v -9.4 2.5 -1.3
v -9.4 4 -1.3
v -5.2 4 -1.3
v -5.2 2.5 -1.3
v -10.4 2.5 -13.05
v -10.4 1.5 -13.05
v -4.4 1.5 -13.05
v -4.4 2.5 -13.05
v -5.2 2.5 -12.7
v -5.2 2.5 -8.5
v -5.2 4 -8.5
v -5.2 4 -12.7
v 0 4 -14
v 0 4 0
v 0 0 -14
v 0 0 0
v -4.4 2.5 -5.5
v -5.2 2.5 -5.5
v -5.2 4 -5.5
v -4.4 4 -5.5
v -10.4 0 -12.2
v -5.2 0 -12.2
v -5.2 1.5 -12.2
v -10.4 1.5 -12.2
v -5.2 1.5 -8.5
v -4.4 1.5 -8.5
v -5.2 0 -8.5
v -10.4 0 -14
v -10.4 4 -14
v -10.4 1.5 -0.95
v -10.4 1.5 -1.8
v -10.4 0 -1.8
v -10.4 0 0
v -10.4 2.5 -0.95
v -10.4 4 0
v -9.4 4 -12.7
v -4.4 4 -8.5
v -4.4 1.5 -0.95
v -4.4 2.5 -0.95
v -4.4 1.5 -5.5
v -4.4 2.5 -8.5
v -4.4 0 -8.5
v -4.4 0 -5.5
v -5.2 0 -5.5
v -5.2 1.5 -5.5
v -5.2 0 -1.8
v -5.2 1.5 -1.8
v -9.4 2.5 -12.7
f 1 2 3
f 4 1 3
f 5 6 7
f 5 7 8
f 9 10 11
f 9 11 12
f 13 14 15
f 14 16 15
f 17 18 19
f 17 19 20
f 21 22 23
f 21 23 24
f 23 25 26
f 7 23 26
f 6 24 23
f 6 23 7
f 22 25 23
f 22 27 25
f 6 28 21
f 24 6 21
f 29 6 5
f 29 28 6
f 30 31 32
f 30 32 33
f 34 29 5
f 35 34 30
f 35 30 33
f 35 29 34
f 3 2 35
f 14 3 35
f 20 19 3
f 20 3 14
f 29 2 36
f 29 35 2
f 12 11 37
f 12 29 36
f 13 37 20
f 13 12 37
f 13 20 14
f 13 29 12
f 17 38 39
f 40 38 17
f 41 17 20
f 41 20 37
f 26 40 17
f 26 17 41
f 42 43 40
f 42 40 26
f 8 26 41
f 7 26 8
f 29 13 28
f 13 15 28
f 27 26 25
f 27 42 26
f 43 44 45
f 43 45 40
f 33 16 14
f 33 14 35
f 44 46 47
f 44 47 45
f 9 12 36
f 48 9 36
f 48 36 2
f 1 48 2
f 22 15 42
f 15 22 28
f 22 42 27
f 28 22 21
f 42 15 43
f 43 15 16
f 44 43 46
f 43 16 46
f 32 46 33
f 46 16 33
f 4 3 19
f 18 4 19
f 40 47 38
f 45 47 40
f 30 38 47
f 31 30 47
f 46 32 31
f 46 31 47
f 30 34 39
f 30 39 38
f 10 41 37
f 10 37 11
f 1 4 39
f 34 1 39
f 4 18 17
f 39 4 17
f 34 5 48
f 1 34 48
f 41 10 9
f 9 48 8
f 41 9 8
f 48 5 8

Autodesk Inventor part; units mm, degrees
ref_plane "YZ Plane" through (0, 0, 0) normal (1, 0, 0) x (0, 1, 0)
ref_plane "XZ Plane" through (0, 0, 0) normal (0, 1, 0) x (-1, 0, 0)
ref_plane "XY Plane" through (0, 0, 0) normal (0, 0, 1) x (1, 0, 0)
sketch "스케치1" plane through (0, 0, 0) normal (0, 1, 0) x (-1, 0, 0)
  line L0 (0, 0) -> (0, -14)
  line L1 (0, -14) -> (10.4, -14)
  line L2 (0, 0) -> (10.4, 0)
  line L3 (10.4, 0) -> (10.4, -1.8)
  line L4 (10.4, -1.8) -> (5.2, -1.8)
  line L5 (5.2, -1.8) -> (5.2, -5.5)
  line L6 (5.2, -5.5) -> (4.4, -5.5)
  line L7 (4.4, -5.5) -> (4.4, -8.5)
  line L8 (4.4, -8.5) -> (5.2, -8.5)
  line L9 (5.2, -8.5) -> (5.2, -12.2)
  line L10 (5.2, -12.2) -> (10.4, -12.2)
  line L11 (10.4, -12.2) -> (10.4, -14)
  line L12 (10.4, -0.95) -> (4.4, -0.95) construction
  line L13 (4.4, -0.95) -> (4.4, -13.05) construction
  line L14 (4.4, -13.05) -> (10.4, -13.05) construction
  dimension "d0" = 14
  dimension "d2" = 10.4
  dimension "d3" = 1.8
  dimension "d5" = 3.7
  dimension "d6" = 0.8
  dimension "d7" = 3
  dimension "d8" = 0.8
  dimension "d9" = 3.7
  dimension "d47" = 12.1
  dimension "d48" = 0.85
  dimension "d49" = 0.85
  dimension "d63" = 6
extrude "돌출1" add sketch "스케치1" along normal blind 4
sketch "스케치9" plane through (-10.4, 0, -14) normal (-1, 0, 0) x (0, 0, 1)
  line L0 (12.2, 0) -> (14, 0) projected
  line L1 (14, 0) -> (14, 4) projected
  line L2 (12.2, 4) -> (14, 4) projected
  line L3 (12.2, 0) -> (12.2, 4) projected
  line L4 (0, 0) -> (1.8, 0) projected
  line L5 (1.8, 0) -> (1.8, 4) projected
  line L6 (0, 4) -> (1.8, 4) projected
  line L7 (0, 0) -> (0, 4) projected
  line L8 (13.05, 1.5) -> (0.95, 1.5)
  line L9 (0.95, 1.5) -> (0.95, 2.5)
  line L10 (0.95, 2.5) -> (13.05, 2.5)
  line L11 (13.05, 2.5) -> (13.05, 1.5)
  dimension "d55" = 0.95
  dimension "d56" = 0.95
  dimension "d60" = 1
  dimension "d61" = 1.5
  dimension "d62" = 1.5
  dimension "d71" = 12.1
extrude "돌출9" cut sketch "스케치9" against normal blind 6 contours L8 L5 L10 L3 | L3 L10 L11 L8 | L8 L9 L10 L5
sketch "스케치10" plane through (0, 4, 0) normal (0, 1, 0) x (1, 0, 0)
  line L0 (0, 0) -> (0, 14) projected
  line L1 (0, 14) -> (-10.4, 14) projected
  line L2 (-10.4, 14) -> (-10.4, 12.2) projected
  line L3 (-10.4, 12.2) -> (-5.2, 12.2) projected
  line L4 (-5.2, 12.2) -> (-5.2, 8.5) projected
  line L5 (-5.2, 8.5) -> (-4.4, 8.5) projected
  line L6 (-4.4, 8.5) -> (-4.4, 5.5) projected
  line L7 (-4.4, 5.5) -> (-5.2, 5.5) projected
  line L8 (-5.2, 5.5) -> (-5.2, 1.8) projected
  line L9 (-5.2, 1.8) -> (-10.4, 1.8) projected
  line L10 (-10.4, 1.8) -> (-10.4, 0) projected
  line L11 (-10.4, 0) -> (0, 0) projected
  line L12 (-5.2, 1.8) -> (-10.4, 1.8) projected
  line L13 (-5.2, 12.2) -> (-10.4, 12.2) projected
  line L14 (-10.4, 1.8) -> (-9.4, 1.8)
  line L15 (-9.4, 1.8) -> (-9.4, 12.2)
  line L16 (-9.4, 12.2) -> (-10.4, 12.2)
  line L17 (-10.4, 12.2) -> (-10.4, 1.8)
  point P0 (-9.4, 1.8)
  point P1 (-9.4, 12.2)
  dimension "d64" = 1
extrude "돌출10" add sketch "스케치10" against normal up to surface (1.5 mm away) contours L17 L3 L15 L9
sketch "스케치11" plane through (0, 4, 0) normal (0, 1, 0) x (1, 0, 0)
  line L0 (-9.4, 1.3) -> (-5.2, 1.3)
  line L1 (-5.2, 1.3) -> (-5.2, 12.7)
  line L2 (-5.2, 12.7) -> (-9.4, 12.7)
  line L3 (-9.4, 12.7) -> (-9.4, 1.3)
  line L4 (-9.4, 1.8) -> (-9.4, 12.2) projected
  line L5 (-5.2, 12.2) -> (-5.2, 8.5) projected
  line L6 (-5.2, 1.8) -> (-9.4, 1.8) projected
  line L7 (-9.4, 12.2) -> (-5.2, 12.2) projected
  point P0 (0, 0)
  point P1 (-5.2, 12.2)
  dimension "d67" = 0.5
  dimension "d68" = 0.5
extrude "돌출11" cut sketch "스케치11" against normal up to surface (1.5 mm away) contours L3 L6 L1 L0 | L3 L2 L1 L7
equation "\"d5\" = d9"
equation "\"d9\" = 0.5 * d0 - 0.5 * d7 - d3"
equation "\"d48\" = d49"
equation "\"d55\" = d56"
equation "\"d61\" = d62"
properties part number "_3D 인쇄"
